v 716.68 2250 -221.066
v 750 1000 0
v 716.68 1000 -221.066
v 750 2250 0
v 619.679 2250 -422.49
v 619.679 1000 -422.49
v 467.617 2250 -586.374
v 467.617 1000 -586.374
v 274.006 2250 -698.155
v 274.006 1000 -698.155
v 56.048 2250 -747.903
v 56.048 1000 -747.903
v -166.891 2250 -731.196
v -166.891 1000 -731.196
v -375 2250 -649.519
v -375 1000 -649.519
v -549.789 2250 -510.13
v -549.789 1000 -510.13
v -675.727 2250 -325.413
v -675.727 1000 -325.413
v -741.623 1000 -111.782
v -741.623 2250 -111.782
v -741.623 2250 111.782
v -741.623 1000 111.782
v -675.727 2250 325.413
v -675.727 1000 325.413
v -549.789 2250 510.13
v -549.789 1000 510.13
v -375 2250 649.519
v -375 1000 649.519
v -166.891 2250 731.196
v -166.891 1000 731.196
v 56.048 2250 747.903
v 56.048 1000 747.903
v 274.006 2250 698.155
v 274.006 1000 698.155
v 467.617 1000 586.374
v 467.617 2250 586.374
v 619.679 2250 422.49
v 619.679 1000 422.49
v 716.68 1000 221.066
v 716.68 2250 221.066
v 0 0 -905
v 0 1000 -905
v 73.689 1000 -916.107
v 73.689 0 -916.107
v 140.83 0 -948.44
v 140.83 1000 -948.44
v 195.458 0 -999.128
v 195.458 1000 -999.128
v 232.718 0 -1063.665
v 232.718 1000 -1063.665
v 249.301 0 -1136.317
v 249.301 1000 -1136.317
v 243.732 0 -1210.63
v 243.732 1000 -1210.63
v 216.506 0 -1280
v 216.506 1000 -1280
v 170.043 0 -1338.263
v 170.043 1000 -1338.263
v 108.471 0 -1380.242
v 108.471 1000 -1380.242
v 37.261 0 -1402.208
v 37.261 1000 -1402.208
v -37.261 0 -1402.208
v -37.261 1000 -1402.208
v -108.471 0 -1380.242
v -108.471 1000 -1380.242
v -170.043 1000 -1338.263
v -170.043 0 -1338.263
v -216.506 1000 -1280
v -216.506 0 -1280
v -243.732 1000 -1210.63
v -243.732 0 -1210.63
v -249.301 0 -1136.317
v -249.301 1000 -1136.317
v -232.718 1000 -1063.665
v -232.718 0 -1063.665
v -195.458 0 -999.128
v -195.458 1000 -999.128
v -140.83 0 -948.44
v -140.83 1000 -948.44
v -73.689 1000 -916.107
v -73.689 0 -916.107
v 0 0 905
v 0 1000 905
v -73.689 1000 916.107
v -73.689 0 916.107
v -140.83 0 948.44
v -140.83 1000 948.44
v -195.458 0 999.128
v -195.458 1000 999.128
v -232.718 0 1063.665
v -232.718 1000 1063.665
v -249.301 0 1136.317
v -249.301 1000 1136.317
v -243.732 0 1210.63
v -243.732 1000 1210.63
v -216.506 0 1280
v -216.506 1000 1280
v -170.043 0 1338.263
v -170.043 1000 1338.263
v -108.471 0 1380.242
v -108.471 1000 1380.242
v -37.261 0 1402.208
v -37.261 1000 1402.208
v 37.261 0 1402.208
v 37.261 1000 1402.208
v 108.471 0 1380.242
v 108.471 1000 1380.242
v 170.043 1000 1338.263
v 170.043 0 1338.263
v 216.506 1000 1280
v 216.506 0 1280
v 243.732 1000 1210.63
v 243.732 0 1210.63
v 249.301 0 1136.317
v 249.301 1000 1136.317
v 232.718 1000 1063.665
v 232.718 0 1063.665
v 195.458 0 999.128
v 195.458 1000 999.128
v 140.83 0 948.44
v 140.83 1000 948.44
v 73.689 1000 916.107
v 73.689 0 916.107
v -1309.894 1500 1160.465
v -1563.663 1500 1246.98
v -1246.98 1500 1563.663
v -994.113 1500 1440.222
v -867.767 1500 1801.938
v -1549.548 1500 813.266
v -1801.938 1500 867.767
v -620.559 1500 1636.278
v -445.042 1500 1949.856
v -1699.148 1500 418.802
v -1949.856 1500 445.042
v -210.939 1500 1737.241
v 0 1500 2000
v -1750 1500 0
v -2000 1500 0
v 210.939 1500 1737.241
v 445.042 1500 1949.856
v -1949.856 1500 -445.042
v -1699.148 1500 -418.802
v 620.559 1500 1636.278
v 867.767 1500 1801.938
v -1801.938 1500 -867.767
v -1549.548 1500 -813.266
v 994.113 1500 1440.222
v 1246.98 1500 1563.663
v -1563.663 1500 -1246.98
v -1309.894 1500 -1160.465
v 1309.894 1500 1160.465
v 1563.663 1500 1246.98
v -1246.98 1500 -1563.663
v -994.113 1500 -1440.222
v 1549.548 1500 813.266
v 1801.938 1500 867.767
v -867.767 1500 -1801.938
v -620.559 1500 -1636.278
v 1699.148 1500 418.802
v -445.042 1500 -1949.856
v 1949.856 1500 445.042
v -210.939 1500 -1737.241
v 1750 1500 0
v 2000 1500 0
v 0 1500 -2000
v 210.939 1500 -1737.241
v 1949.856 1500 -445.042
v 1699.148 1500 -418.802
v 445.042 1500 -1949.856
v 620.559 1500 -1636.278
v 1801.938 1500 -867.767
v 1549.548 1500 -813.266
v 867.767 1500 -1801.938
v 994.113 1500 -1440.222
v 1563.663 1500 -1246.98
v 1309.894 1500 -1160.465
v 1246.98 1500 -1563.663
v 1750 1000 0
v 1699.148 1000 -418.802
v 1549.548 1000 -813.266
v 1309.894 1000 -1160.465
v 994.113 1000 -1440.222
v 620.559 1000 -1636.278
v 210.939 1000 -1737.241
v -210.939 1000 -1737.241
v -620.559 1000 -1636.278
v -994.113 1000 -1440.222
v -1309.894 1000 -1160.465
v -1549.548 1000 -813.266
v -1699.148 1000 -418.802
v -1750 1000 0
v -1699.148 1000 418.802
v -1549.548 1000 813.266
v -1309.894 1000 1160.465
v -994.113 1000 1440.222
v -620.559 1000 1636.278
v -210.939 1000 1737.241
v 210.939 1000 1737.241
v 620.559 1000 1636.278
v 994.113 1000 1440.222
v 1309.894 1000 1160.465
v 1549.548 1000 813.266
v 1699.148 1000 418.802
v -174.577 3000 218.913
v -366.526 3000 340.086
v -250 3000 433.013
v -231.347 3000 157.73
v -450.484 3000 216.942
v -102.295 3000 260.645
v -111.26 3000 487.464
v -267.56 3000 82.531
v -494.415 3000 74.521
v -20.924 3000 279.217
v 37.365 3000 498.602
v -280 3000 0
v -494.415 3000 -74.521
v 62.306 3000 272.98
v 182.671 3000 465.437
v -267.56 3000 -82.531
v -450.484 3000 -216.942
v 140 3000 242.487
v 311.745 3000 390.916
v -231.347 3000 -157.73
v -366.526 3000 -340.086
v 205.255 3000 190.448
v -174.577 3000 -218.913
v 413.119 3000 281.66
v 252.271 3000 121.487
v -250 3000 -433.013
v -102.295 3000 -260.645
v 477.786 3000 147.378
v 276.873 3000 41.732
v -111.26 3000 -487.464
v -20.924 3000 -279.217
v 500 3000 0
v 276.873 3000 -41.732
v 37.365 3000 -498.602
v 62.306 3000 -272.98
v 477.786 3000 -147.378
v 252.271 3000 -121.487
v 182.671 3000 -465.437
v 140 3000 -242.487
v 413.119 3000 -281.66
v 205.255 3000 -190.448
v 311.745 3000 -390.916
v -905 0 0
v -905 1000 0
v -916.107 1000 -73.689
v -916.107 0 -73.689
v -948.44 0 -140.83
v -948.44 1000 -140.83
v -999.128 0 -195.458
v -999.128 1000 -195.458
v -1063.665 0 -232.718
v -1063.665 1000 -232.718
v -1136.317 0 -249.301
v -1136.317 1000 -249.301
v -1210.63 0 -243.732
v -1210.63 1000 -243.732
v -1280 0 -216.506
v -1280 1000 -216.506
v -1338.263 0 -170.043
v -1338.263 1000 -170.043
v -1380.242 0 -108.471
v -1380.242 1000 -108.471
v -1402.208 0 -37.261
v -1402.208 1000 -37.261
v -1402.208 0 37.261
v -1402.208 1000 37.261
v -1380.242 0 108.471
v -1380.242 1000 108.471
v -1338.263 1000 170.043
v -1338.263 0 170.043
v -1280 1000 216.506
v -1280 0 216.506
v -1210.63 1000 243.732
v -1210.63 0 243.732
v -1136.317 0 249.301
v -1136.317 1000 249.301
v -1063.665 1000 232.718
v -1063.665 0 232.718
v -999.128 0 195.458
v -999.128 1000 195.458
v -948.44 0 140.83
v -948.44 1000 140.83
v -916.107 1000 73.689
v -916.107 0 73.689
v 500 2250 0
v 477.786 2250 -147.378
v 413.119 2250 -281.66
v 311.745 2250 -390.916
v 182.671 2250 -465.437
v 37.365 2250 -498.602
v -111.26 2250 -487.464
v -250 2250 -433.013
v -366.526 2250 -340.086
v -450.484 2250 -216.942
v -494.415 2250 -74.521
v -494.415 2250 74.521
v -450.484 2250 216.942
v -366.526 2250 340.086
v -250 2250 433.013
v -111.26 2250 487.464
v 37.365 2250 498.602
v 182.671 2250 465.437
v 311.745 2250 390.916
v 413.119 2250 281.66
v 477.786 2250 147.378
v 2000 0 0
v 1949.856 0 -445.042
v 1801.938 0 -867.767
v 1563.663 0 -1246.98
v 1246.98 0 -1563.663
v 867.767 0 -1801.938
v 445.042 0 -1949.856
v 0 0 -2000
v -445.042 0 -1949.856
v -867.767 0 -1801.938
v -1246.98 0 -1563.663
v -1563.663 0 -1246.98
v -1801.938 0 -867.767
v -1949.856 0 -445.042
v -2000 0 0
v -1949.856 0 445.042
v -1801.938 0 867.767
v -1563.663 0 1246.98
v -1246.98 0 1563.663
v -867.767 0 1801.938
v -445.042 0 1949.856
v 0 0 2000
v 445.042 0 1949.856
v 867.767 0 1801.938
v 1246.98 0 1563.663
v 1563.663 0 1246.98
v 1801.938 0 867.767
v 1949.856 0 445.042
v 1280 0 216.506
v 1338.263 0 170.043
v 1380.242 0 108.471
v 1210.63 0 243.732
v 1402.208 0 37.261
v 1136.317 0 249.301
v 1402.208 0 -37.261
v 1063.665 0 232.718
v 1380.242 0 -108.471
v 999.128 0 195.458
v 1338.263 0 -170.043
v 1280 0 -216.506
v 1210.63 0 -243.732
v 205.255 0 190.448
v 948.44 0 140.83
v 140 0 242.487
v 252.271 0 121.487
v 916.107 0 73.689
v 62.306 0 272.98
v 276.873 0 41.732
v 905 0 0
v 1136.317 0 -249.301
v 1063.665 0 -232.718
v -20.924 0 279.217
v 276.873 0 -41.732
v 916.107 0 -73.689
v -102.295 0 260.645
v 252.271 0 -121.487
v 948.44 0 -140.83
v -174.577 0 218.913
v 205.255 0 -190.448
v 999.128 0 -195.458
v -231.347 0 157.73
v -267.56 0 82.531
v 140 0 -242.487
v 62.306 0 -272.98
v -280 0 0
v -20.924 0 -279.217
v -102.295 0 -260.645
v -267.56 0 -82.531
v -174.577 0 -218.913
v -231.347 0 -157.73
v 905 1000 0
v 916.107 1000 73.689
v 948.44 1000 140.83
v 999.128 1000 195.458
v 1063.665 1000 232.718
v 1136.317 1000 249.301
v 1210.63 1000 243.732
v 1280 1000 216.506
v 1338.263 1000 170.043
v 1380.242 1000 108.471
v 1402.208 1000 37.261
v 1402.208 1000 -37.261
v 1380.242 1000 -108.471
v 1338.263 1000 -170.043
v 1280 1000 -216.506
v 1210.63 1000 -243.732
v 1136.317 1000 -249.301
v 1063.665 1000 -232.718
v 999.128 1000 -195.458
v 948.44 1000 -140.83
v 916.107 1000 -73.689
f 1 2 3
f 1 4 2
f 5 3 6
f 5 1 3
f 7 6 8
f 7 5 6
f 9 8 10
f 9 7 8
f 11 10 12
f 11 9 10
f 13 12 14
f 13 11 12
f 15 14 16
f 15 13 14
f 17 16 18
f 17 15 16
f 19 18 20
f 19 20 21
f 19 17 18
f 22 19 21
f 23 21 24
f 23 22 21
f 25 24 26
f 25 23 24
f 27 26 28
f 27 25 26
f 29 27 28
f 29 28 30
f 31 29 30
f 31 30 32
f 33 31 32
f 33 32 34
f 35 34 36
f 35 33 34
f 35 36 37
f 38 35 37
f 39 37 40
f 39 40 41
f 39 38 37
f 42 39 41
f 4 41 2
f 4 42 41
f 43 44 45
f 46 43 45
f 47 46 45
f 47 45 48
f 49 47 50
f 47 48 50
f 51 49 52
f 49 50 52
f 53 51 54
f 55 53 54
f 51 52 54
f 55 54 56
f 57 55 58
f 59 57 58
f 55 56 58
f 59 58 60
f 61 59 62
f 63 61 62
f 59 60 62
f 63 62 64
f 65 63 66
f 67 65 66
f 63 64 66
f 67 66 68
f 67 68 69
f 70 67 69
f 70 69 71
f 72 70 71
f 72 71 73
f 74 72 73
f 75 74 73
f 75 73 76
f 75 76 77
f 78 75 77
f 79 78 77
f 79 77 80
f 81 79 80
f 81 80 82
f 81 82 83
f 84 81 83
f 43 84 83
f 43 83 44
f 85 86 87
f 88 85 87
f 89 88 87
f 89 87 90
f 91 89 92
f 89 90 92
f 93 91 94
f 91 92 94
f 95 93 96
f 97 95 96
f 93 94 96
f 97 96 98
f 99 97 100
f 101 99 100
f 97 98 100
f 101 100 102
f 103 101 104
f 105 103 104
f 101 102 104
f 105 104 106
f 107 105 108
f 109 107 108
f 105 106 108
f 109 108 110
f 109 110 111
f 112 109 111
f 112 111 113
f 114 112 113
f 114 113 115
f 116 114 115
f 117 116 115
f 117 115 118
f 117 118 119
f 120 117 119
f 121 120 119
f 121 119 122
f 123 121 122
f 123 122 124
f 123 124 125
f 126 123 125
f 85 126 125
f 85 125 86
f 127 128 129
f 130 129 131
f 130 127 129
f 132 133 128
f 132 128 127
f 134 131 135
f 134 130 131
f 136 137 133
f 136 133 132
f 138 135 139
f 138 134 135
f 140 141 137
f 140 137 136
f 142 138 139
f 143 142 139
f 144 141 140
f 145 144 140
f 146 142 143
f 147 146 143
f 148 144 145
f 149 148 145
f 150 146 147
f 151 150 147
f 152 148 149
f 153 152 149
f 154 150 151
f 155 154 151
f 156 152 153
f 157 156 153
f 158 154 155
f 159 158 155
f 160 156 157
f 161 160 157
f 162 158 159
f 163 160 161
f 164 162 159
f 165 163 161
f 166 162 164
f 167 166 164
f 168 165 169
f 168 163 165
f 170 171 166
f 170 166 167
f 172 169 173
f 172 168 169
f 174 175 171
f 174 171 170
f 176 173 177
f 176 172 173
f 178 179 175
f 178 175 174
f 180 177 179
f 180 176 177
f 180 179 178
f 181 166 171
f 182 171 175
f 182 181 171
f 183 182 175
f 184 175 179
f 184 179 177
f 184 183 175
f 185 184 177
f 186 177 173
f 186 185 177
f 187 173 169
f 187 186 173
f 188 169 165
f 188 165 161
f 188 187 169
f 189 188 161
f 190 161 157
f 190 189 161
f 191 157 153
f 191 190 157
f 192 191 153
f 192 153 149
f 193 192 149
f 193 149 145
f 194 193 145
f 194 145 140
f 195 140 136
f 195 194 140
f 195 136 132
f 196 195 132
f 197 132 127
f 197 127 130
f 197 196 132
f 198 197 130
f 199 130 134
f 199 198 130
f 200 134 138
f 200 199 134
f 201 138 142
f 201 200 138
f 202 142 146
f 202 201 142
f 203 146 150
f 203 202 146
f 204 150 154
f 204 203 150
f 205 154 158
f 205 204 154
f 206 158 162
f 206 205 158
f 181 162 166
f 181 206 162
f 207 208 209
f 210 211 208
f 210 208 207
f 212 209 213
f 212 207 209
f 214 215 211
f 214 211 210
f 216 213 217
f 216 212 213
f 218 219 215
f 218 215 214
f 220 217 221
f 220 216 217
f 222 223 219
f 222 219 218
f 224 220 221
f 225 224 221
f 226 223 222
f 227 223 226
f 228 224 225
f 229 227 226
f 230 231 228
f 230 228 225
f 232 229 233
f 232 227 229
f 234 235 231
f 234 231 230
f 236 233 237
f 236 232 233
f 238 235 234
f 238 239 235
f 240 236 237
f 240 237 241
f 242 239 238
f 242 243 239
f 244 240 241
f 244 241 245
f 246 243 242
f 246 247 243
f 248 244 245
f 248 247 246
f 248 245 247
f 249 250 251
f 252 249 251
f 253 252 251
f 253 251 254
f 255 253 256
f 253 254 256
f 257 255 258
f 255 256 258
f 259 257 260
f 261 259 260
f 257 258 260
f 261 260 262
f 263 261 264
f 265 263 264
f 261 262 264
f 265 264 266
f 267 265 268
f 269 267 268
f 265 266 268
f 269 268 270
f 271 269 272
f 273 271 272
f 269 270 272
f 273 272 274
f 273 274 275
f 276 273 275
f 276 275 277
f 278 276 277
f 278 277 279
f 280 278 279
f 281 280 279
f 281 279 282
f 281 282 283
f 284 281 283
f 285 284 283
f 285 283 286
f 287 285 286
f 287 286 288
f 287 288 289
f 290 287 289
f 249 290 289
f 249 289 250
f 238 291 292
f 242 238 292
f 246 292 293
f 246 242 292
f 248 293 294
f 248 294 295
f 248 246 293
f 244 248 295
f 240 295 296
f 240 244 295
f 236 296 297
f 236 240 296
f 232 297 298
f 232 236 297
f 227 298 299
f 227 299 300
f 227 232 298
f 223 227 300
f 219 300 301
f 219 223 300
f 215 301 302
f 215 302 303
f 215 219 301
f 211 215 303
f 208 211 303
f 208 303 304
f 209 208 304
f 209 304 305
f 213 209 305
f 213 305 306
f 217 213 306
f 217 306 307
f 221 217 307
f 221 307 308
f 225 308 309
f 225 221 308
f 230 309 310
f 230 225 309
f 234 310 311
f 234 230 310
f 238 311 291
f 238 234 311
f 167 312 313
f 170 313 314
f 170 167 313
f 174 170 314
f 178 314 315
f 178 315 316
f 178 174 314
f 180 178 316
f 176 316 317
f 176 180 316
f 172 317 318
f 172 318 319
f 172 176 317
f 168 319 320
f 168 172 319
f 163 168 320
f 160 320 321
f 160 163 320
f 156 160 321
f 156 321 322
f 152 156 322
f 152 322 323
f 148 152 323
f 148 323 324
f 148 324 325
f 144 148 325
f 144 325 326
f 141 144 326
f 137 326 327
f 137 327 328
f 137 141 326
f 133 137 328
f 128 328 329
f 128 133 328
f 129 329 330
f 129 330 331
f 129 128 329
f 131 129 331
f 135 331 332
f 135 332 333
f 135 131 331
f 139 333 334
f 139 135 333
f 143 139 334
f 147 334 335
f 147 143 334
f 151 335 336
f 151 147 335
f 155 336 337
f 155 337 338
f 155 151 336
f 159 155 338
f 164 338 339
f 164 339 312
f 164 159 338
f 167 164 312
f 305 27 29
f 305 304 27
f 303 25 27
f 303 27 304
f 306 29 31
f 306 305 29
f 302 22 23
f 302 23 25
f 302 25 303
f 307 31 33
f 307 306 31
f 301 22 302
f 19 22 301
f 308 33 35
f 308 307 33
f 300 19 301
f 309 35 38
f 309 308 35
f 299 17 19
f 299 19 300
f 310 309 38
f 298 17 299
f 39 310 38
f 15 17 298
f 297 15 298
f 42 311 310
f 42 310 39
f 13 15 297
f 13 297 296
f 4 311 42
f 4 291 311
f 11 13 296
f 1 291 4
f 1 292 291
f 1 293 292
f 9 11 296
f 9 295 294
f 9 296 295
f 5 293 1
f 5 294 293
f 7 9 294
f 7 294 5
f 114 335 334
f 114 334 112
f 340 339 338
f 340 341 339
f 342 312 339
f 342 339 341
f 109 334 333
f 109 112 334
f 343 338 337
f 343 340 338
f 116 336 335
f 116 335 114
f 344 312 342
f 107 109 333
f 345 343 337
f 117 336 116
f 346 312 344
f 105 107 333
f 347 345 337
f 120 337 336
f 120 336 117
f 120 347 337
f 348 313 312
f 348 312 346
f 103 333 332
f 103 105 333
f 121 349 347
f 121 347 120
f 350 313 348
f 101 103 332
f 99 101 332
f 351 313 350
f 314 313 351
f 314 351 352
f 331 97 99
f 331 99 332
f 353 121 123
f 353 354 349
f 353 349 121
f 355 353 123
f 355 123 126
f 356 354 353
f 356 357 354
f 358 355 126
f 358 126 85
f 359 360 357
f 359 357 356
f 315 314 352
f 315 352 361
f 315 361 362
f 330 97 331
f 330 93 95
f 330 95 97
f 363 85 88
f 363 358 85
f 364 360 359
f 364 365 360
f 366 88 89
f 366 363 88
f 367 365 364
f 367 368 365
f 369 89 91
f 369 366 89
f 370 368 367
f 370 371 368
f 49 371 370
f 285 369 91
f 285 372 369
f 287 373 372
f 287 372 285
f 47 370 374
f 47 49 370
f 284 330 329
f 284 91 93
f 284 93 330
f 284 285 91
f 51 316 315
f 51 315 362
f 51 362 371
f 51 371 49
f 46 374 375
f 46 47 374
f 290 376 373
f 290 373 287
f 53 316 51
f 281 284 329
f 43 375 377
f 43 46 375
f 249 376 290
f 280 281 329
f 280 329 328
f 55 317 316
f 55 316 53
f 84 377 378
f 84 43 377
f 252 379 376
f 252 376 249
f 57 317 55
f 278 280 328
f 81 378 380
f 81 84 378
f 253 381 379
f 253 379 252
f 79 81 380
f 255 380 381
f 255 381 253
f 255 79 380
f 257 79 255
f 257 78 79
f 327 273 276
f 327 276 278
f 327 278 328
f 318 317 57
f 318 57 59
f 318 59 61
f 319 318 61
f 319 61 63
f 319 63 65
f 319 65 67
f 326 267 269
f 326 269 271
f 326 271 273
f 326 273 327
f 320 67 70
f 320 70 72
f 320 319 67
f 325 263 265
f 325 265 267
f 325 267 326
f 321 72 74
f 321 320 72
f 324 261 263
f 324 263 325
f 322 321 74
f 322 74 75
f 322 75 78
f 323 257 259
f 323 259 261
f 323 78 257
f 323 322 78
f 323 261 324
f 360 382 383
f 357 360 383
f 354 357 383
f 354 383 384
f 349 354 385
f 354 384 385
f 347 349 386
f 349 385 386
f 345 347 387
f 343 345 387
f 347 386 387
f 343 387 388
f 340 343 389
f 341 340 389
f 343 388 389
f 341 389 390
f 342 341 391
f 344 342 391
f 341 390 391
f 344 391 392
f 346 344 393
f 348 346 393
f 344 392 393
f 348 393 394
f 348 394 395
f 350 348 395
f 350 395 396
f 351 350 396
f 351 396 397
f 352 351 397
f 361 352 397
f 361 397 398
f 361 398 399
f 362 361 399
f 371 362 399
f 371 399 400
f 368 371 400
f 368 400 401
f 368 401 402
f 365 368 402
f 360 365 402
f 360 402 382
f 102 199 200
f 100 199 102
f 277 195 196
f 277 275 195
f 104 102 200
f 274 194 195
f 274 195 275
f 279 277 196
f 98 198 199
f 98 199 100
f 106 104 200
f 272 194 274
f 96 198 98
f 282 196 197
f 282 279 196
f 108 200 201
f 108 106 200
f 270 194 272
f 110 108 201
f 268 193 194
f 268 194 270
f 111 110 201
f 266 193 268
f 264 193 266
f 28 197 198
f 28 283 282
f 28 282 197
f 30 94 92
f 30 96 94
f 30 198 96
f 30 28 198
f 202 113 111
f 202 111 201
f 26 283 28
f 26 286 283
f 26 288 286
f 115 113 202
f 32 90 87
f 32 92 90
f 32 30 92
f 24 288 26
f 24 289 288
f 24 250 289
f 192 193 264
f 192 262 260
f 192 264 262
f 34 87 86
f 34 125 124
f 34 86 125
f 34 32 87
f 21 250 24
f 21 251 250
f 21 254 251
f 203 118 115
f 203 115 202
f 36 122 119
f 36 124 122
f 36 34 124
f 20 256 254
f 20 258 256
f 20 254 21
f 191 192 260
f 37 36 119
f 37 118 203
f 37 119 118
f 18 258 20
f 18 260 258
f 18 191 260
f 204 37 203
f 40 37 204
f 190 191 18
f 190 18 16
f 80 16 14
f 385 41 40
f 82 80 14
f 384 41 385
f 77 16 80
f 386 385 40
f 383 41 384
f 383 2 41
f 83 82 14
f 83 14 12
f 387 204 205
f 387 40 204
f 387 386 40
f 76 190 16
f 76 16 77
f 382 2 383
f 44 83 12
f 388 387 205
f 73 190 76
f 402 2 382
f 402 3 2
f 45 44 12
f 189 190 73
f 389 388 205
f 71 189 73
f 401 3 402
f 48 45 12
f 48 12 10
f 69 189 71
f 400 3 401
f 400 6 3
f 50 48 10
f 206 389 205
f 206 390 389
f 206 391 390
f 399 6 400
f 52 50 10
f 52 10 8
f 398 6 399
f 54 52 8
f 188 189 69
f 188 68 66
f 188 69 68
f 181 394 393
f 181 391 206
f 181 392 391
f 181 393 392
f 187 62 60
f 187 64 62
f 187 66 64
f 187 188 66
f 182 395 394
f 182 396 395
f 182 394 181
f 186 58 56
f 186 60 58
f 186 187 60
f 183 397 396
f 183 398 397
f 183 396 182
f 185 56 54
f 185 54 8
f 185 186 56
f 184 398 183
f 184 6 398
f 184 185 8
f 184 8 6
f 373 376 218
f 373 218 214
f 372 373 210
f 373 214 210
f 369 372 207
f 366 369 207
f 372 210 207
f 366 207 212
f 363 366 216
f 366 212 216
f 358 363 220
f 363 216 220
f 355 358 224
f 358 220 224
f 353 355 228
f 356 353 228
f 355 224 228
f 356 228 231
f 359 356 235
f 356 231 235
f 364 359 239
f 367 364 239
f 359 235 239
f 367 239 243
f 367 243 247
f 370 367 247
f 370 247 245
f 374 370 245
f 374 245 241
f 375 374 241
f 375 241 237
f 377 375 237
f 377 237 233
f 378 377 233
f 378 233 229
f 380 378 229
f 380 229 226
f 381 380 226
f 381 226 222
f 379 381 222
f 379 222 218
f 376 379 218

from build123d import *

# Parameters (mm, degrees)
SKETCH2_R          = 280
CUT_EXTRUDE1_DEPTH = 4124.105625618
SKETCH3_R          = 250
CUT_EXTRUDE2_DEPTH = 3465.101615138
CIRPATTERN1_COUNT  = 4


with BuildPart() as part:
    # Sketch1 → Revolve1 (revolve)
    with BuildSketch(Plane.XY):
        Polygon((0, 0), (2000, 0), (2000, 1500), (1750, 1500), (1750, 1000), (750, 1000), (750, 2250), (500, 2250), (500, 3000), (0, 3000), align=None)
    revolve(axis=Axis((0, 0, 0), (0, 1, 0)))

    # Sketch2 → Cut-Extrude1 (cut, through all)
    with BuildSketch(Plane(origin=(0, 3000, 0), x_dir=(1, 0, 0), z_dir=(0, 1, 0))):
        with Locations(Location((0, 0, 0), (0, 0, 180))):
            Circle(SKETCH2_R)
    extrude(amount=-CUT_EXTRUDE1_DEPTH, mode=Mode.SUBTRACT)

    # Sketch3 → Cut-Extrude2 (cut, through all)
    with BuildSketch(Plane(origin=(0, 1000, 0), x_dir=(1, 0, 0), z_dir=(0, 1, 0))):
        with Locations(Location((1155, 0, 0), (0, 0, 180))):
            Circle(SKETCH3_R)
    cut_extrude2 = extrude(amount=-CUT_EXTRUDE2_DEPTH, mode=Mode.SUBTRACT)

    # CirPattern1: Cut-Extrude2 ×4 about axis
    cirpattern1_axis = Axis((0, 0, 0), (0, 1, 0))
    for i in range(1, CIRPATTERN1_COUNT):
        add(cut_extrude2.rotate(cirpattern1_axis, i * 360 / CIRPATTERN1_COUNT), mode=Mode.SUBTRACT)


solid = part.part
